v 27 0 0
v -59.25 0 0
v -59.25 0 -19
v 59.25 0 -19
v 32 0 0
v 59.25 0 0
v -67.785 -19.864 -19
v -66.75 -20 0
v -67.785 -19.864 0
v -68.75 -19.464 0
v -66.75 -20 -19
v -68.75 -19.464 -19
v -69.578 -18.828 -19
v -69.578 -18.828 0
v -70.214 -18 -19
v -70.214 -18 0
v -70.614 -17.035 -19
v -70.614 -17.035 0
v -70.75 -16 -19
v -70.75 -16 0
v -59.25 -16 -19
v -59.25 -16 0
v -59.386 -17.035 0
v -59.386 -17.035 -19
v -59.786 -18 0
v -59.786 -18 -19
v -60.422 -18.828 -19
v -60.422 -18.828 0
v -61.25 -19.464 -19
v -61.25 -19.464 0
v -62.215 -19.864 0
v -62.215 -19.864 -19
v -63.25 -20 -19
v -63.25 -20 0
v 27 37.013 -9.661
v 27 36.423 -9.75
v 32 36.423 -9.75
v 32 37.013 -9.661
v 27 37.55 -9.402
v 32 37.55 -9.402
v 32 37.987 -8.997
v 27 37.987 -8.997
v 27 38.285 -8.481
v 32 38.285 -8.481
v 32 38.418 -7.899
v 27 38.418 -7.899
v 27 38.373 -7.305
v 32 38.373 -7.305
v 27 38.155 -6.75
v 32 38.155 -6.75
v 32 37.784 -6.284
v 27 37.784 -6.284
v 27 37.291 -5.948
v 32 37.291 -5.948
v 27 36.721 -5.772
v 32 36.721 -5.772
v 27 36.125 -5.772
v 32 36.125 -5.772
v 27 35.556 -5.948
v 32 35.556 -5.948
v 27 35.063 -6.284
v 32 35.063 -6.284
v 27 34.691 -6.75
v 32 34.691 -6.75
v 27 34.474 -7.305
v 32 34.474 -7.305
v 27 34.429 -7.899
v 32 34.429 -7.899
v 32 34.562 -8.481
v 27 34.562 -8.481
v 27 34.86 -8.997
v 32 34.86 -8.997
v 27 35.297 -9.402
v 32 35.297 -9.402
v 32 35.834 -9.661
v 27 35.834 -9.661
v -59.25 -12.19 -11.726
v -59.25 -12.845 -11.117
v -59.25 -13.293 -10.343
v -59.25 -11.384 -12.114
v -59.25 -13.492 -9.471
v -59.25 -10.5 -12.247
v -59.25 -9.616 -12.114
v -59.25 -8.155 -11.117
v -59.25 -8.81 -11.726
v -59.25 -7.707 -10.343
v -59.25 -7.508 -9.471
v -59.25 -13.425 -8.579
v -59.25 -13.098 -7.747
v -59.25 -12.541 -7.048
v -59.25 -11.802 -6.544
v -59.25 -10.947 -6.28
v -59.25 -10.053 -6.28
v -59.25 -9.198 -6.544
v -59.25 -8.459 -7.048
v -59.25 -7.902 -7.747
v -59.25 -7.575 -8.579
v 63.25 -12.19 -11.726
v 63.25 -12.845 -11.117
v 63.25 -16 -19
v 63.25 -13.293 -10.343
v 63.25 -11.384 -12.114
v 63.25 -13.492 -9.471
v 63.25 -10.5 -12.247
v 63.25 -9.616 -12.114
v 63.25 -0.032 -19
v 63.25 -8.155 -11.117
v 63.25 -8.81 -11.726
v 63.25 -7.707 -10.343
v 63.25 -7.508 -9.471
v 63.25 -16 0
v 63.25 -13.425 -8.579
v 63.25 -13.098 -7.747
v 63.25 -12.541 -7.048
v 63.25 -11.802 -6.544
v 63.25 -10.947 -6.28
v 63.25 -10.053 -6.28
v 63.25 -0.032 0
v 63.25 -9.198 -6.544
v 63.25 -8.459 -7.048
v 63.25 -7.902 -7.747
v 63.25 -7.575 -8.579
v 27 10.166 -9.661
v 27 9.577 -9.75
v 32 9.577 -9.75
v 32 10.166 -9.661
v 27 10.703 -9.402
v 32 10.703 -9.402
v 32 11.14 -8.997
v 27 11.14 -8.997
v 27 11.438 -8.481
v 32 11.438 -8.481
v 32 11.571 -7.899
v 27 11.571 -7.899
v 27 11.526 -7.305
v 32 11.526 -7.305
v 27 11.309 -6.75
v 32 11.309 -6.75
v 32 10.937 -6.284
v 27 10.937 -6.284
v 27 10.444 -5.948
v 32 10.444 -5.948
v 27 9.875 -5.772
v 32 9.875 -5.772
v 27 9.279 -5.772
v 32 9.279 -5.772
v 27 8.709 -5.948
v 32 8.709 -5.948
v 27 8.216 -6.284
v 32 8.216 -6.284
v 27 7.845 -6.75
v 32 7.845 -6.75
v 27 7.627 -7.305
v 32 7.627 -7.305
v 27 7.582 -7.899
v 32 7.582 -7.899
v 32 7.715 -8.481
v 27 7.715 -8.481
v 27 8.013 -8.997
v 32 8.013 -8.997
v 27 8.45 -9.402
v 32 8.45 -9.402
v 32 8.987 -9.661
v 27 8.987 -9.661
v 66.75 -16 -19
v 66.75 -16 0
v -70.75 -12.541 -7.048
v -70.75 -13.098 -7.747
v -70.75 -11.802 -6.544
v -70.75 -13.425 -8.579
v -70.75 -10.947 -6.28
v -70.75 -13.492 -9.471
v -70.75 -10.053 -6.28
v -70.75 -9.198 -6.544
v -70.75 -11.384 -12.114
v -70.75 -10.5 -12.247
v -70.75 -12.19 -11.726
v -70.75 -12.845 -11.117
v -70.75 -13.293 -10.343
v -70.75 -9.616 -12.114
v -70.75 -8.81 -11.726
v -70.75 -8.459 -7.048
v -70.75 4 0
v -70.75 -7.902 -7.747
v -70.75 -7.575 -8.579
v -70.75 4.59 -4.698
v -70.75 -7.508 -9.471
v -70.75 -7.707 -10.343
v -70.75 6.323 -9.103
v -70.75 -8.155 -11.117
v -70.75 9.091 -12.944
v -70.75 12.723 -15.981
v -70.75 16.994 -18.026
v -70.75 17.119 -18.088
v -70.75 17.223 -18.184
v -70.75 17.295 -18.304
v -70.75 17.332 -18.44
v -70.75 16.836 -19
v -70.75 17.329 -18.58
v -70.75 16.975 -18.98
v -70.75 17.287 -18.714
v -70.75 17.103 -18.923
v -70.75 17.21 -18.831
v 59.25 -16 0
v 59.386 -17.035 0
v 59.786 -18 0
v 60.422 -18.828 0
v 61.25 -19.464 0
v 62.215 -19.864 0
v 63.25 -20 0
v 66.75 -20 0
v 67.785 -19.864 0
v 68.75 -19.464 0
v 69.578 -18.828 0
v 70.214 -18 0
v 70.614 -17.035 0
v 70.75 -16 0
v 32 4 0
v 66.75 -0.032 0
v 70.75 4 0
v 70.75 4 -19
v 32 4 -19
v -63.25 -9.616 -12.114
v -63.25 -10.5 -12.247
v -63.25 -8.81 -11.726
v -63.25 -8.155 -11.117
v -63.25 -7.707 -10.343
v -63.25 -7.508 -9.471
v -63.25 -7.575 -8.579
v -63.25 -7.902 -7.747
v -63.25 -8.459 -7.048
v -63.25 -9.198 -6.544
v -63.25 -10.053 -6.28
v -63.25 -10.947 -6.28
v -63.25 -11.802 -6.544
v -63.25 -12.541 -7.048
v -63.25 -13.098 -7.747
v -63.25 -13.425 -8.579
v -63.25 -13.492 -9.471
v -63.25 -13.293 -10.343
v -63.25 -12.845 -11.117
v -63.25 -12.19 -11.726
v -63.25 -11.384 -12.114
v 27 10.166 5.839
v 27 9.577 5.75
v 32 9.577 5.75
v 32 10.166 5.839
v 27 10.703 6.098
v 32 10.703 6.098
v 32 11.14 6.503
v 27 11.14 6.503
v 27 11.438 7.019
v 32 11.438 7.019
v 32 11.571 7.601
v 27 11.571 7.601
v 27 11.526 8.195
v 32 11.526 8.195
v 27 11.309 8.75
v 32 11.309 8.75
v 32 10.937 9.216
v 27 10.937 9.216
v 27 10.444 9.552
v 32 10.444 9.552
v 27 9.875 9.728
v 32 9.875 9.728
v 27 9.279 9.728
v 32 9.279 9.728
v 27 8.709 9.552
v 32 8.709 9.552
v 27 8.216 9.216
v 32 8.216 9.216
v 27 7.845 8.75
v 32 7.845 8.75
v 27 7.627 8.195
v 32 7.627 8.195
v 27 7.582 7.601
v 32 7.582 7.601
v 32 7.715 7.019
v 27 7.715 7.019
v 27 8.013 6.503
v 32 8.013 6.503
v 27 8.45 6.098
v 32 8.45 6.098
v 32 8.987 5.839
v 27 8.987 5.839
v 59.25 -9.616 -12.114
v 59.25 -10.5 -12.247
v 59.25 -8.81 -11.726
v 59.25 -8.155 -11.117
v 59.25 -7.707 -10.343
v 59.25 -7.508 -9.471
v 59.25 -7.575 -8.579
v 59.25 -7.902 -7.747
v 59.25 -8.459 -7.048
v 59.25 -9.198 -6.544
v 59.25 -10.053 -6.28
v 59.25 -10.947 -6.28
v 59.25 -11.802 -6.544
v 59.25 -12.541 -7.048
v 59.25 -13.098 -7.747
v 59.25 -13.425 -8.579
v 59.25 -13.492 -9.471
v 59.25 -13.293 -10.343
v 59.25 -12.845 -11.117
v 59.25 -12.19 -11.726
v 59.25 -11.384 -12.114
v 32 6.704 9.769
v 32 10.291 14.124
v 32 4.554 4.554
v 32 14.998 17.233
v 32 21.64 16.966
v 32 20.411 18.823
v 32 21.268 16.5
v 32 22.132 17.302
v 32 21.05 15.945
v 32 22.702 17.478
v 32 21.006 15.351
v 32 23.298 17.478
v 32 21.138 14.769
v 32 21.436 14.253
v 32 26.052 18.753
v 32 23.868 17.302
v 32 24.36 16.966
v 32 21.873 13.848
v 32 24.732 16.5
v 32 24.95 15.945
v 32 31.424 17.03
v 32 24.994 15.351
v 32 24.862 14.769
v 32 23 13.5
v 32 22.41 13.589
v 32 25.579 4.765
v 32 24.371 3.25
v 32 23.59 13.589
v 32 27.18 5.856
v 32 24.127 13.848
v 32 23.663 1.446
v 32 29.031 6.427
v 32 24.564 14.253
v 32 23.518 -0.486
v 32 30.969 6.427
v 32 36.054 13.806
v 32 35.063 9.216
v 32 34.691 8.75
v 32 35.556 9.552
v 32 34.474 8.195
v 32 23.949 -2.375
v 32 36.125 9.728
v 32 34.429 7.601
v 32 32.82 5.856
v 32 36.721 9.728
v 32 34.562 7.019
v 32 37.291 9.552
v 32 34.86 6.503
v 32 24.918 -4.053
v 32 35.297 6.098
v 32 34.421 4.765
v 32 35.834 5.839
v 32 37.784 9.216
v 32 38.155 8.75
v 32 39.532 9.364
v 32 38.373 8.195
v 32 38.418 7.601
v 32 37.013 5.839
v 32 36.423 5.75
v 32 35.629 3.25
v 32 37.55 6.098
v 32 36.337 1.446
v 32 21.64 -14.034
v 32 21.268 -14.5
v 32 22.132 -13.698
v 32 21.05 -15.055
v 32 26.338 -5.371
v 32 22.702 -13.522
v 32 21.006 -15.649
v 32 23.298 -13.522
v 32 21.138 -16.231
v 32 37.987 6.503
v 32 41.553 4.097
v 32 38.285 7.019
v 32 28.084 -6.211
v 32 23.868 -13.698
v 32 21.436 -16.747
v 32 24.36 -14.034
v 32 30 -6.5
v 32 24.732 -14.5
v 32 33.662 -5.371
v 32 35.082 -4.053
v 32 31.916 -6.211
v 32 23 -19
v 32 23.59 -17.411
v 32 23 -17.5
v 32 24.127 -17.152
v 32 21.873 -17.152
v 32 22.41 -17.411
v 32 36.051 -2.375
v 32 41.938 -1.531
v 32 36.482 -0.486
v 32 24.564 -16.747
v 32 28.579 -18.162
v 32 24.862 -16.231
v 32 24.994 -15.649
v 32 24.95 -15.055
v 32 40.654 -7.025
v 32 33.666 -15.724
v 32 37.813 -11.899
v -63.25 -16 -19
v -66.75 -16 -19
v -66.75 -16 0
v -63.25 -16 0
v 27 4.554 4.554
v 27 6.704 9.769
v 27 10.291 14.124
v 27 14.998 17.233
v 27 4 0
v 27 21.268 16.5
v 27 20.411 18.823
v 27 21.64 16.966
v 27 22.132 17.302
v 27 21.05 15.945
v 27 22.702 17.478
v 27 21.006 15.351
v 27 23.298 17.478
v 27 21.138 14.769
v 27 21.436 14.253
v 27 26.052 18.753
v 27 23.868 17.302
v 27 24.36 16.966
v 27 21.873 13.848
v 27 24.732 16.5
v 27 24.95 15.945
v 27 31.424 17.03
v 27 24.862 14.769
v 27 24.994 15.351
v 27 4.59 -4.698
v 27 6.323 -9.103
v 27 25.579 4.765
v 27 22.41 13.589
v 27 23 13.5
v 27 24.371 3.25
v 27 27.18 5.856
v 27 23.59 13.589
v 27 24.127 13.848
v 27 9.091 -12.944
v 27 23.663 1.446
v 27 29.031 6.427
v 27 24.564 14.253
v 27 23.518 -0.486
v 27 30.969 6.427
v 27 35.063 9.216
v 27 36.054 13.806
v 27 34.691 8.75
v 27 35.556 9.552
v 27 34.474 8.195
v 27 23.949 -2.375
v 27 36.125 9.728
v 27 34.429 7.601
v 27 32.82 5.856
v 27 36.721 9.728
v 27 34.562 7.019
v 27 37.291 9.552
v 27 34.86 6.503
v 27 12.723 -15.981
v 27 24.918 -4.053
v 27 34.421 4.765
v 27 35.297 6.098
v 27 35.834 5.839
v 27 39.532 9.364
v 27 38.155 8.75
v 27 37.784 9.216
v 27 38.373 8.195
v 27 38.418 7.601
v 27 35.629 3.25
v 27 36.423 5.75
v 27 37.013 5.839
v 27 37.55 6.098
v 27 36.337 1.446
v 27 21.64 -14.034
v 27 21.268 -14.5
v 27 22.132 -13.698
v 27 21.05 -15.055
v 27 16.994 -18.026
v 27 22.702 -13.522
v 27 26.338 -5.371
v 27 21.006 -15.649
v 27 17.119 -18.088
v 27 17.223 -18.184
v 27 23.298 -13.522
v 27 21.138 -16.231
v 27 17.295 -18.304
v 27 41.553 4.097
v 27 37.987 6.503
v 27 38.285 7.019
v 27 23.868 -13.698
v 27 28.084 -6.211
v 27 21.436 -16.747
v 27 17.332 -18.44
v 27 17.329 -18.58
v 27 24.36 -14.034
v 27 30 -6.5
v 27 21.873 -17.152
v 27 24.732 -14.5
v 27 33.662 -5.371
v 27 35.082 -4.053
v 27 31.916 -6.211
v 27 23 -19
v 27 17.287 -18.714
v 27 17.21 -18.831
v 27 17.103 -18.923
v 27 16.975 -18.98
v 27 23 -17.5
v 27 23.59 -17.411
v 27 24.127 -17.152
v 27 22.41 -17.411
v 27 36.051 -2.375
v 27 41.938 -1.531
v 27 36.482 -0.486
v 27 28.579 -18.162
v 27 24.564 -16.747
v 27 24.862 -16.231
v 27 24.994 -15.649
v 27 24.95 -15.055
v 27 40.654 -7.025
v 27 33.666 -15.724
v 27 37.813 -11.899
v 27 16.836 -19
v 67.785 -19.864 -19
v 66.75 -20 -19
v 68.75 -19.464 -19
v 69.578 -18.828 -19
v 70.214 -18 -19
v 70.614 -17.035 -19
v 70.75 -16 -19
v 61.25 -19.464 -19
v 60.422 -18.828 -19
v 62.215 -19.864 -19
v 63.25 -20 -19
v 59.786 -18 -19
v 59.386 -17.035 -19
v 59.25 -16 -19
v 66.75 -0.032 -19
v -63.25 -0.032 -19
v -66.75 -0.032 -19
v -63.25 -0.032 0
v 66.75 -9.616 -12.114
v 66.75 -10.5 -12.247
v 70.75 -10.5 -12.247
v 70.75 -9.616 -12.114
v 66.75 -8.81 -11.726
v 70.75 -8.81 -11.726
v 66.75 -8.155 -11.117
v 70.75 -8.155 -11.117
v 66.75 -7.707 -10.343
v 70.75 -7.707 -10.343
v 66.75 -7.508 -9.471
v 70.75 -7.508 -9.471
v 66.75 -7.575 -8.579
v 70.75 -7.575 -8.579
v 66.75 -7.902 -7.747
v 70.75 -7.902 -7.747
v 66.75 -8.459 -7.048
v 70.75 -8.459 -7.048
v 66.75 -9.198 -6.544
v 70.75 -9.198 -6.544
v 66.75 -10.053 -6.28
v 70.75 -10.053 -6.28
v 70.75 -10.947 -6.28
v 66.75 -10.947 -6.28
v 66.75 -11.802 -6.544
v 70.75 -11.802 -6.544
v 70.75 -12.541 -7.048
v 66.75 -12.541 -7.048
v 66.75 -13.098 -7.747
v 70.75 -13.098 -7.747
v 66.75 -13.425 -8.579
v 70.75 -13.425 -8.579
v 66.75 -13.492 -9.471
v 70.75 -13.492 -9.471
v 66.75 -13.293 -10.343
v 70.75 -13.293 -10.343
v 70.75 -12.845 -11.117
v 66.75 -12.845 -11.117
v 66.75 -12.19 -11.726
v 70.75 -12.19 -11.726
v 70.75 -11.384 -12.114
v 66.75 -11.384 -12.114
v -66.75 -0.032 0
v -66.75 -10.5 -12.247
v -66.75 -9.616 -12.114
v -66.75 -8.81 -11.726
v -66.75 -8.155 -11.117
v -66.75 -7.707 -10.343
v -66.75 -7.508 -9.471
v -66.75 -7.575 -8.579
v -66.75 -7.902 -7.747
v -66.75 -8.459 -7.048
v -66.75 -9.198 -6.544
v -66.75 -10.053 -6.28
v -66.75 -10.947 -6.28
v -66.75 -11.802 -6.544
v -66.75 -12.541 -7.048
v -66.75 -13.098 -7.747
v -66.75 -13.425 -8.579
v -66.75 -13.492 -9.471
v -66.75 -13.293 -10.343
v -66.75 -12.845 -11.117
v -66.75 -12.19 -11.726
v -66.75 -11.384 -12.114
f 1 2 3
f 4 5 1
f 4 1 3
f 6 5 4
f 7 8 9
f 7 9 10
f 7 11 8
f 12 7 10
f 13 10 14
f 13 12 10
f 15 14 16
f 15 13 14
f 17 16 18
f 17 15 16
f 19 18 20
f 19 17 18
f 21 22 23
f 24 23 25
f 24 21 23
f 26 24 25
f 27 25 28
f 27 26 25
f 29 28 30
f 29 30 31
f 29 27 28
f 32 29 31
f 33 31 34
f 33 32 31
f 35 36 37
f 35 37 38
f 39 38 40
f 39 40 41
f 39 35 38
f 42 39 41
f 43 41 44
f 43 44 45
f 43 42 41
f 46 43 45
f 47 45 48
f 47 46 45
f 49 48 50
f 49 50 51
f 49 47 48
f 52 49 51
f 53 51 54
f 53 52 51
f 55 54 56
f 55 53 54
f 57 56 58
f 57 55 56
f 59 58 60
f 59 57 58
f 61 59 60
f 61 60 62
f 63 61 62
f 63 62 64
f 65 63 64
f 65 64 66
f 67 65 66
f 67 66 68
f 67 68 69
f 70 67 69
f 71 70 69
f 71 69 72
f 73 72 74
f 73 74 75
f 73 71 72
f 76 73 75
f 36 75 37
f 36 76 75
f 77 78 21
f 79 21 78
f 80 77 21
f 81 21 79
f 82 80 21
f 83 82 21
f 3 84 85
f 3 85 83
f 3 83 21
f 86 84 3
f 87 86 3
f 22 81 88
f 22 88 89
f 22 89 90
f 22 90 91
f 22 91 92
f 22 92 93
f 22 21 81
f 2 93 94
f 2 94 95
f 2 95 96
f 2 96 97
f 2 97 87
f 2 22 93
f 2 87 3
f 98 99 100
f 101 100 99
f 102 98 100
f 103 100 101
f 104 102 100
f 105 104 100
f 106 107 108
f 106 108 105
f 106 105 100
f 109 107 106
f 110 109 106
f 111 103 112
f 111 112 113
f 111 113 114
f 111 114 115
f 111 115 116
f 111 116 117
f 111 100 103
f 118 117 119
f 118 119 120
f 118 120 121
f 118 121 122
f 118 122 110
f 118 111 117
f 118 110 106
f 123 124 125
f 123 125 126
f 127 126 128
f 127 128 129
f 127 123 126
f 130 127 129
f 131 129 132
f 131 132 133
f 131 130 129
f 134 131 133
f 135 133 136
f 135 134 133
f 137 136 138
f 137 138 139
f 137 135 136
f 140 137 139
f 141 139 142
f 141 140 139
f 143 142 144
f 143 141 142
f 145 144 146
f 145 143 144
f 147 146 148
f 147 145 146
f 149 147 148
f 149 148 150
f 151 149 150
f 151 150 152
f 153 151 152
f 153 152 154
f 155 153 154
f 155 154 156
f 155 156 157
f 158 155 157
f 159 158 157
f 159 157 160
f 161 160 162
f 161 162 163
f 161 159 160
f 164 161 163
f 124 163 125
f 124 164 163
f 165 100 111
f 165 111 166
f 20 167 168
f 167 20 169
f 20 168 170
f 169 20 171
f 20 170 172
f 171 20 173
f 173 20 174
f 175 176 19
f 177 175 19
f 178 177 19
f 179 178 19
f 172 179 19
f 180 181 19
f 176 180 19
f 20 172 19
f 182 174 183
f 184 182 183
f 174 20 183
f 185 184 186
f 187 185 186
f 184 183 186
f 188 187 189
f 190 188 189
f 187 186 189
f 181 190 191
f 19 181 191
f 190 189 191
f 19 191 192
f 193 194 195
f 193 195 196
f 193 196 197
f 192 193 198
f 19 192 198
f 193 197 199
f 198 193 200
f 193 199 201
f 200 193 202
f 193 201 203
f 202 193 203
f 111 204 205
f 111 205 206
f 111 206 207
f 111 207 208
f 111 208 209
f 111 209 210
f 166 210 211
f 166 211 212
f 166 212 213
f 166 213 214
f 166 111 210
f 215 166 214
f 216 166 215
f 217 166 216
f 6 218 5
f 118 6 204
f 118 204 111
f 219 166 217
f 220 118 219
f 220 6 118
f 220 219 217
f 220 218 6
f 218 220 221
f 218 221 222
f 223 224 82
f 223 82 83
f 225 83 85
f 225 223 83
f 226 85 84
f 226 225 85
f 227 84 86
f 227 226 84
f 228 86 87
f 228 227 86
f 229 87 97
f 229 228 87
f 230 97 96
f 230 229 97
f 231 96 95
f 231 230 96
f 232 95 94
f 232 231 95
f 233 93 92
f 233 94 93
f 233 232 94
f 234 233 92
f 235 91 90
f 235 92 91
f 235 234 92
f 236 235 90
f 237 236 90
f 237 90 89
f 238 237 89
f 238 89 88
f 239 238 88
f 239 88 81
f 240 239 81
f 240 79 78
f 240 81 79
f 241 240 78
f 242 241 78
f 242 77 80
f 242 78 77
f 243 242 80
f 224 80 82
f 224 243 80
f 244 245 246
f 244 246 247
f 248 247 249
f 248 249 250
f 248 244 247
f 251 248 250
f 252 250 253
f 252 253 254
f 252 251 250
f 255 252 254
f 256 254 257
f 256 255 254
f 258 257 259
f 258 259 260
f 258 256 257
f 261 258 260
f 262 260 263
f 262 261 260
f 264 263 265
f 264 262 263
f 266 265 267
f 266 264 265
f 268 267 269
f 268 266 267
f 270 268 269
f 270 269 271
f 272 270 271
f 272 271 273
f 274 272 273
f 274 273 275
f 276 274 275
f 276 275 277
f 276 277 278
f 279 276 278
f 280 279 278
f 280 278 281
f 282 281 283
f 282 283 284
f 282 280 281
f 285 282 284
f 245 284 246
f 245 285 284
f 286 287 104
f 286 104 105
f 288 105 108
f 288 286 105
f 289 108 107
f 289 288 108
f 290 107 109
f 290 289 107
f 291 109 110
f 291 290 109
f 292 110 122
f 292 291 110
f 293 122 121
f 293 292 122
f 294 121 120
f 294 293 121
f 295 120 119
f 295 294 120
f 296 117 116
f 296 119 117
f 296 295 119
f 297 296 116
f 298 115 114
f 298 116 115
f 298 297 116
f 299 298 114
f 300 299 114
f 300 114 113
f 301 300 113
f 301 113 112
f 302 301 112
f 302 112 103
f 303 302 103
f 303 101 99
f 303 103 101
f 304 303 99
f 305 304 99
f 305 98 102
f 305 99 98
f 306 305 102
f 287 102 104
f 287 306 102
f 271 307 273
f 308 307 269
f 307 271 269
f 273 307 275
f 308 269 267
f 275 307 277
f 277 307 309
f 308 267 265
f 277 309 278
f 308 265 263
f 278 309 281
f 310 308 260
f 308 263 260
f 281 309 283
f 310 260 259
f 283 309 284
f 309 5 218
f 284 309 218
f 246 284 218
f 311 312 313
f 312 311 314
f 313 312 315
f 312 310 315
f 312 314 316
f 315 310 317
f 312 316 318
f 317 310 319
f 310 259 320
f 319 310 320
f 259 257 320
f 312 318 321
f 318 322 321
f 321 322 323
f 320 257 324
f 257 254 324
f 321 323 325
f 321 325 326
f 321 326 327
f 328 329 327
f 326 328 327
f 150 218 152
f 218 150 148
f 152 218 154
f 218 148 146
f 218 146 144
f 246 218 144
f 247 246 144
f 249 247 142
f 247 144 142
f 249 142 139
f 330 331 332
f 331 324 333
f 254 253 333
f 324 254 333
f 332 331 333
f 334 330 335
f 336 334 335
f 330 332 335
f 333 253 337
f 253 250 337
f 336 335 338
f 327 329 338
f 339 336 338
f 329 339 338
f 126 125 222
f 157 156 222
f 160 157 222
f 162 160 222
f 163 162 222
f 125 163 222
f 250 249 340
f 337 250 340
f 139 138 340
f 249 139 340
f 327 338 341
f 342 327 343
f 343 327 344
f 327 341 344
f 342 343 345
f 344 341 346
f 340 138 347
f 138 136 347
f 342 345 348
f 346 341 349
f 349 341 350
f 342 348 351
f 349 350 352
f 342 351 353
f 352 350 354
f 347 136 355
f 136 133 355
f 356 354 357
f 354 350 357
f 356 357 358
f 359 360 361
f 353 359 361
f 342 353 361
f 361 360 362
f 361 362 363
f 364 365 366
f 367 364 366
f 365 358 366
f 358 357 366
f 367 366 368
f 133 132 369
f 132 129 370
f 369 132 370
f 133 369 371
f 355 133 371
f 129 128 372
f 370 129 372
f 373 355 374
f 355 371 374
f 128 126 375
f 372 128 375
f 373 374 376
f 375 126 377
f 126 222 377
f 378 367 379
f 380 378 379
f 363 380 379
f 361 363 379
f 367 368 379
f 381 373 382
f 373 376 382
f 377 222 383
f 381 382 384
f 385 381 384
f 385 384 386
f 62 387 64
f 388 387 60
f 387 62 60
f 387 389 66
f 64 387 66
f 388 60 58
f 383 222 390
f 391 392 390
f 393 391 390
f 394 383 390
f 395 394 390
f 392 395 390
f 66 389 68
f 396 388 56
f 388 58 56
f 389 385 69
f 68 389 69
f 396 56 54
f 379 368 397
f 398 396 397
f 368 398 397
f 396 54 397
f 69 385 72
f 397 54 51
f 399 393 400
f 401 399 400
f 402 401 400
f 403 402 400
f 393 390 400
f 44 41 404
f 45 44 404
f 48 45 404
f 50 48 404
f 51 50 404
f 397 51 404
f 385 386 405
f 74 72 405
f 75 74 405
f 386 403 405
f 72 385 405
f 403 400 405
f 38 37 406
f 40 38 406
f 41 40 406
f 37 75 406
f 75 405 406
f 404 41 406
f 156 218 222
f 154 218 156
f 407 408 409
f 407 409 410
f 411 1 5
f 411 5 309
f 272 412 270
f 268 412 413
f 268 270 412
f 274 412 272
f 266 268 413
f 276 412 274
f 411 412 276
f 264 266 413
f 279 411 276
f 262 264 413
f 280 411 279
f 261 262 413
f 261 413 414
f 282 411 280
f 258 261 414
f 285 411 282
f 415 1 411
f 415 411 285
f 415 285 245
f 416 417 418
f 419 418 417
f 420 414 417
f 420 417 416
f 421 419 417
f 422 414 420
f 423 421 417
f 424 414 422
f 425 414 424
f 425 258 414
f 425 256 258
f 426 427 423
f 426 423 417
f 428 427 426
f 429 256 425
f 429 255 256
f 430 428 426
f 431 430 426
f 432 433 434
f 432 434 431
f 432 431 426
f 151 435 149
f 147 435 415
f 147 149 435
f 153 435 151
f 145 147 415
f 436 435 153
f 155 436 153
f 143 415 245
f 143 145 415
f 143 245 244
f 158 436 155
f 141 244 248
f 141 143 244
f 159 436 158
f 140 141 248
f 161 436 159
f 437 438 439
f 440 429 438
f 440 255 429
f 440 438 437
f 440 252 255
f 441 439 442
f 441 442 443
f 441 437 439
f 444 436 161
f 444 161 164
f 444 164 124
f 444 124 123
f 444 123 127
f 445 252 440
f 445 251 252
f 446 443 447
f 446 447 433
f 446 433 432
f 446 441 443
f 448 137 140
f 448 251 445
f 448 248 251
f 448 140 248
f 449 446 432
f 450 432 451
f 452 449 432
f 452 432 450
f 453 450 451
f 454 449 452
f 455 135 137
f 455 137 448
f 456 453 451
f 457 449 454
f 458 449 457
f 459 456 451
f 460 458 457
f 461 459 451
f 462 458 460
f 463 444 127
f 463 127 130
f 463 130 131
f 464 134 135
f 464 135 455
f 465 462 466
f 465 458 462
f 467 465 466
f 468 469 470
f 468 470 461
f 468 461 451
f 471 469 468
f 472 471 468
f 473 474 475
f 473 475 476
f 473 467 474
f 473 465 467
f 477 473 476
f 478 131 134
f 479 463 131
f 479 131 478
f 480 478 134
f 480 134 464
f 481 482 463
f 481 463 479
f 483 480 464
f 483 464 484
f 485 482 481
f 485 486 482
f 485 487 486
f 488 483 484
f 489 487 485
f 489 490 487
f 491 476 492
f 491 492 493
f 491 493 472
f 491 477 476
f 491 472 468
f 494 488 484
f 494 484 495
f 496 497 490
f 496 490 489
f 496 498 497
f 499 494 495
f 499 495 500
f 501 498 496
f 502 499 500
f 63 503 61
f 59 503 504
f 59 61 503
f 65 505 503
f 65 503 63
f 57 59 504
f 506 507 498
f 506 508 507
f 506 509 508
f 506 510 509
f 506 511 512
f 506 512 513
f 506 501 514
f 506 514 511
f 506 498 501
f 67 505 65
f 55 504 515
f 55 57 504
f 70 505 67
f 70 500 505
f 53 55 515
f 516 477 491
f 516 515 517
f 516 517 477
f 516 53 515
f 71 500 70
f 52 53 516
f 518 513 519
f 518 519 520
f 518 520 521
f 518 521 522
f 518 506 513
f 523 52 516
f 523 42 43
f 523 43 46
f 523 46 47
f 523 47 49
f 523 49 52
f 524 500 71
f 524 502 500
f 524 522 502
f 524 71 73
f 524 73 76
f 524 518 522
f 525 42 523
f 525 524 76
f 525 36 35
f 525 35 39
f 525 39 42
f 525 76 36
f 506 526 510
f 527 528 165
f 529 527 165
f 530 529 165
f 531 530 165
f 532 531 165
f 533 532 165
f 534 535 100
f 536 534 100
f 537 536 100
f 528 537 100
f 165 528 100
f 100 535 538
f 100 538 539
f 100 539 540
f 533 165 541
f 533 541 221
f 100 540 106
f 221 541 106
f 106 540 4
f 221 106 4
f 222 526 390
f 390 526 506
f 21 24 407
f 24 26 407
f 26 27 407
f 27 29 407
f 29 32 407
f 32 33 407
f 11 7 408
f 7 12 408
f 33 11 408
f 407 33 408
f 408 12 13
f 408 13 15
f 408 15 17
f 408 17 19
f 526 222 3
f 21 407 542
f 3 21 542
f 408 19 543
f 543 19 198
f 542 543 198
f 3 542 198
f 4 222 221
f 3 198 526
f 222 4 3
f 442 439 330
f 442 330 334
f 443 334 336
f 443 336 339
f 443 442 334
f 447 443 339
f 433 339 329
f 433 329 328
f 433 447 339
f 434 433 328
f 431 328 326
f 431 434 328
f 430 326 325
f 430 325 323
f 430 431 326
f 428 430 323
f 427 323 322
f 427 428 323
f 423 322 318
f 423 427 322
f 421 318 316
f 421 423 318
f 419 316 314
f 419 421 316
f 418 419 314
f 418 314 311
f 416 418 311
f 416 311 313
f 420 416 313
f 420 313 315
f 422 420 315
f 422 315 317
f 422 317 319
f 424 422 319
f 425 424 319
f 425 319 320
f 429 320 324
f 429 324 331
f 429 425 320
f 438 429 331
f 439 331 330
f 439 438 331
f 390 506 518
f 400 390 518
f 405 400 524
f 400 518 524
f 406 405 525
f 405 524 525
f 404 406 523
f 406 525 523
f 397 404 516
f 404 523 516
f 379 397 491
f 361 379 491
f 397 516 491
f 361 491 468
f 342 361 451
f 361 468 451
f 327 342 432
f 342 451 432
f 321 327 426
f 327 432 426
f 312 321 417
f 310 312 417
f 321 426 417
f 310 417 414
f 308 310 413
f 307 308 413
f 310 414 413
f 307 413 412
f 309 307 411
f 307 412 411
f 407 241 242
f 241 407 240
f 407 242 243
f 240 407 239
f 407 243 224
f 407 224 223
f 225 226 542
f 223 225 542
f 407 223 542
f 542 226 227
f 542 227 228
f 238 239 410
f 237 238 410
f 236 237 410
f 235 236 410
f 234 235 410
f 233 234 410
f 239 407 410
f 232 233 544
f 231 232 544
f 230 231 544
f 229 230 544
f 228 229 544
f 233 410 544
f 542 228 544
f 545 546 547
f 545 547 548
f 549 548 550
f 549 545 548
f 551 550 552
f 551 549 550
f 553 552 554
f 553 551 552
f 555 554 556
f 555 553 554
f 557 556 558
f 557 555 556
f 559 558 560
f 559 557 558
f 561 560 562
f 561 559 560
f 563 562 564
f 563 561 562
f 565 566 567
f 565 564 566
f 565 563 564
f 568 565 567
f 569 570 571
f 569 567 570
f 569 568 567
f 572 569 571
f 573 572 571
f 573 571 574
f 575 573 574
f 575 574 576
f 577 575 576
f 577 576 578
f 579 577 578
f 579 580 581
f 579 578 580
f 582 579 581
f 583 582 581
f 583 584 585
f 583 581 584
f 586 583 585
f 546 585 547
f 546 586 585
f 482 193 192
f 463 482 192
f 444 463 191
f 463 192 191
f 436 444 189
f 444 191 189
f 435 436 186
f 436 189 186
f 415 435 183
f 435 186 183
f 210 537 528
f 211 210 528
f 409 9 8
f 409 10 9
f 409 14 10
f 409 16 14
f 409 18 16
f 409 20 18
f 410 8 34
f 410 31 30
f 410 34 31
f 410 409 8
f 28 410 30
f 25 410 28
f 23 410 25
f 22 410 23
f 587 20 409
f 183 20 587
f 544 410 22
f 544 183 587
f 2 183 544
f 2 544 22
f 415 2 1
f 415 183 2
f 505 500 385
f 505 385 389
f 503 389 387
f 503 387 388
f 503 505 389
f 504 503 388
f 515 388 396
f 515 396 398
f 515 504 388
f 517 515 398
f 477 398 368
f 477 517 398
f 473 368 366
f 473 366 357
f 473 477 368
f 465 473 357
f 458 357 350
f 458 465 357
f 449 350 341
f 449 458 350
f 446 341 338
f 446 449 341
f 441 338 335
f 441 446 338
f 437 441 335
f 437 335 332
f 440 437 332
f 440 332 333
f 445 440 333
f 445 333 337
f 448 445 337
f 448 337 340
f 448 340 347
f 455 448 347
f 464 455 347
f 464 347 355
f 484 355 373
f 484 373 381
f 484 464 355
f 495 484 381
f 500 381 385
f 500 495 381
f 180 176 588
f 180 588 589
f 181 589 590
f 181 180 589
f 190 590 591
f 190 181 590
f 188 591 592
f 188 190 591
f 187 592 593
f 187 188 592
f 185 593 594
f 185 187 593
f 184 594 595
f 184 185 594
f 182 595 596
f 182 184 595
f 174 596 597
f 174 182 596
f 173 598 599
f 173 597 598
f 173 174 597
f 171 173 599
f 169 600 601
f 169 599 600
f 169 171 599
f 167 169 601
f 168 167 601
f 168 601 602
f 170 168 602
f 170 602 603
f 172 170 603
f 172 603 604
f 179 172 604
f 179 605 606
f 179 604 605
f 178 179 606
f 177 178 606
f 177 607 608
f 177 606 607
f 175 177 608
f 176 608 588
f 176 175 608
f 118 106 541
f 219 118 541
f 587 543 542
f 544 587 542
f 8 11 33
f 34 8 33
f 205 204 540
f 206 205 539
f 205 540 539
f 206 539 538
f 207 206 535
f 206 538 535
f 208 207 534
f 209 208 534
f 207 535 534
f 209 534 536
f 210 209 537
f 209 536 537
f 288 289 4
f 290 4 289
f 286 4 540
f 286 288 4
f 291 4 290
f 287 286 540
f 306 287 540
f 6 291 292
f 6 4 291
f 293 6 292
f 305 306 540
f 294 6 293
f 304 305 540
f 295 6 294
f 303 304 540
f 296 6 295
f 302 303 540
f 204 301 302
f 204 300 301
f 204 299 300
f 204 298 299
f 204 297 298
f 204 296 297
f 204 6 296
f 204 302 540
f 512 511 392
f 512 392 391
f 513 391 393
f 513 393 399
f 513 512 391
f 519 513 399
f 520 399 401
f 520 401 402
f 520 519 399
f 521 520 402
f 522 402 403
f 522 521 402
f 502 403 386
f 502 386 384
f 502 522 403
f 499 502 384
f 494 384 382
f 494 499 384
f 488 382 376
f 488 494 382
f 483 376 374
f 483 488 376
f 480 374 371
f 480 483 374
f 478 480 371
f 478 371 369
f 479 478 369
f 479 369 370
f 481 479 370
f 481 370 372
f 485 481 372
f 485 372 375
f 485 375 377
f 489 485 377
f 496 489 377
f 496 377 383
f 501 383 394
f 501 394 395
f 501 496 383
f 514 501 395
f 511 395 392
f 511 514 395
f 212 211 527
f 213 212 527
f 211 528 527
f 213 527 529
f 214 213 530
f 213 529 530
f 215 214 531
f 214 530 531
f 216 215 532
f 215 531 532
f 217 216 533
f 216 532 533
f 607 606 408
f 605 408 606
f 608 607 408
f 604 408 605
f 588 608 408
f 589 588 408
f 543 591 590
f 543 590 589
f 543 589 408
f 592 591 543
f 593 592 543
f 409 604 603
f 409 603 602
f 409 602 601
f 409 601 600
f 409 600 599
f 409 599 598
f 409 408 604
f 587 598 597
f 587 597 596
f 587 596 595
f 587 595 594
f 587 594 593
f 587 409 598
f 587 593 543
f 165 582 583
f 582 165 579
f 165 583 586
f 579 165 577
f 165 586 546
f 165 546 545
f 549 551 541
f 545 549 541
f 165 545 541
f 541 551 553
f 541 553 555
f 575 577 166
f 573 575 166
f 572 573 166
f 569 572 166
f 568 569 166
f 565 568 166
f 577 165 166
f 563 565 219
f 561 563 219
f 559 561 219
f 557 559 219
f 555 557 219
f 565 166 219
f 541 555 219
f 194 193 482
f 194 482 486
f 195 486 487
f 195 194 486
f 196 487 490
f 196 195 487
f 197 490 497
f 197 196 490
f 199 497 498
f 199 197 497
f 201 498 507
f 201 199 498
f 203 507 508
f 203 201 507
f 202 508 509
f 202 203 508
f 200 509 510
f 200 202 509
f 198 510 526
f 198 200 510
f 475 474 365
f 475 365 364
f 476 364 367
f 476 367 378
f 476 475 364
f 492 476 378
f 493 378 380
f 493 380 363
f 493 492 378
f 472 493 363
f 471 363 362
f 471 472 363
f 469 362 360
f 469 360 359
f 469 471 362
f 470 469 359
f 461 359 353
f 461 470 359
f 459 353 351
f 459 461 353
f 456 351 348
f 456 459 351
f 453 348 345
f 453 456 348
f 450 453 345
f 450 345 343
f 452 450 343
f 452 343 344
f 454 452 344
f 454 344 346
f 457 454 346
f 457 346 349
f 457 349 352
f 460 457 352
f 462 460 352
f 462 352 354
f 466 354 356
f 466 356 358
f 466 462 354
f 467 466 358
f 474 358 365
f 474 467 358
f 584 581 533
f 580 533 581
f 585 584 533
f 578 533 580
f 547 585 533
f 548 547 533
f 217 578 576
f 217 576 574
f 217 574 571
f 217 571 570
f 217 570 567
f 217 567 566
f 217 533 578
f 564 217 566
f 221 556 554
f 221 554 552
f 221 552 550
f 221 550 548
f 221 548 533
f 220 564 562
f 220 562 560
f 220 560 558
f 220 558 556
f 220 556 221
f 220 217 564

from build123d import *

# Parameters (mm, degrees)
SKETCH1_W               = 3.5
SKETCH1_H               = 15.967998052
BOSS_EXTRUDE1_DEPTH     = 19
BOSS_EXTRUDE2_START     = 27
SKETCH2_R               = 6.5
SKETCH2_R_2             = 2
BOSS_EXTRUDE2_DEPTH     = 5
BOSS_EXTRUDE3_DEPTH     = 97.75
FILLET1_START           = -72
FILLET1_DEPTH           = 99
CUT_EXTRUDE1_DEPTH      = 85.442658059
CUT_EXTRUDE1_DEPTH_BACK = 85.442658059
SKETCH4_R               = 3
CHAMFER1_SIZE           = 4
FILLET3_R               = 4


with BuildPart() as part:
    # Sketch1 → Boss-Extrude1 (new body)
    with BuildSketch(Plane.XY):
        Polygon((-59.25, 0), (59.25, 0), (59.25, -20), (70.75, -20), (70.75, 4), (-70.75, 4), (-70.75, -20), (-59.25, -20), align=None)
        with Locations((65, -8.016000974)):
            Rectangle(SKETCH1_W, SKETCH1_H, mode=Mode.SUBTRACT)
        with Locations((-65, -8.016000974)):
            Rectangle(SKETCH1_W, SKETCH1_H, mode=Mode.SUBTRACT)
    extrude(amount=-BOSS_EXTRUDE1_DEPTH)

    # Sketch2 → Boss-Extrude2 (add)
    with BuildSketch(Plane(origin=(0, 0, 0), x_dir=(0, 0, -1), z_dir=(1, 0, 0)).offset(BOSS_EXTRUDE2_START)):
        with BuildLine():
            Line((19, 4), (19, 23))
            ThreePointArc((19, 23), (-13.435028843, 36.435028843), (0, 4))
            Line((0, 4), (19, 4))
        make_face()
        with Locations((0, 30)):
            Circle(SKETCH2_R, mode=Mode.SUBTRACT)
        with Locations((15.5, 23)):
            Circle(SKETCH2_R_2, mode=Mode.SUBTRACT)
        with Locations((7.75, 9.576606241)):
            Circle(SKETCH2_R_2, mode=Mode.SUBTRACT)
        with Locations((-7.75, 9.576606241)):
            Circle(SKETCH2_R_2, mode=Mode.SUBTRACT)
        with Locations((-15.5, 23)):
            Circle(SKETCH2_R_2, mode=Mode.SUBTRACT)
        with Locations((-7.75, 36.423393759)):
            Circle(SKETCH2_R_2, mode=Mode.SUBTRACT)
        with Locations((7.75, 36.423393759)):
            Circle(SKETCH2_R_2, mode=Mode.SUBTRACT)
    extrude(amount=BOSS_EXTRUDE2_DEPTH)

    # Sketch3 → Boss-Extrude3 (add)
    with BuildSketch(Plane.ZY.offset(70.75)):
        with BuildLine():
            Line((0, 4), (-19, 4))
            Line((-19, 4), (-19, 23))
            ThreePointArc((-19, 23), (-13.435028843, 9.564971157), (0, 4))
        make_face()
    extrude(amount=-BOSS_EXTRUDE3_DEPTH)

    # Fillet1: read off the stored shape, not the designer's step
    # Fillet1 outline → Fillet1 (cut)
    with BuildSketch(Plane.YZ.offset(FILLET1_START)):
        with BuildLine():
            ThreePointArc((23, -19), (19.957565078, -18.754828438), (16.993647895, -18.025641026))
            ThreePointArc((16.993647895, -18.025641026), (17.329134114, -18.580064077), (16.835585997, -19))
            Line((16.835585997, -19), (23, -19))
        make_face()
    extrude(amount=FILLET1_DEPTH, mode=Mode.SUBTRACT)

    # Sketch4 → Cut-Extrude1 (cut, two sides: drawn at the far end of the back side and taken through both)
    with BuildSketch(Plane(origin=(0, 0, 0), x_dir=(0, 0, -1), z_dir=(1, 0, 0)).offset(-CUT_EXTRUDE1_DEPTH_BACK)):
        with Locations((9.246961263, -10.5)):
            Circle(SKETCH4_R)
    extrude(amount=CUT_EXTRUDE1_DEPTH + CUT_EXTRUDE1_DEPTH_BACK, mode=Mode.SUBTRACT)

    # Chamfer1
    # the kernel refuses this chamfer: 4 mm, written as the material it adds along each edge
    with BuildSketch(Plane(origin=(27, 4, 0), x_dir=(0, -1, 0), z_dir=(1, 0, 0))) as chamfer1_piece_1:
        with BuildLine():
            Line((CHAMFER1_SIZE, 0), (-0.553778005, -4.553778005))
            ThreePointArc((-0.553778005, -4.553778005), (-0.146737714, -2.356798922), (0, 0))
            Line((0, 0), (CHAMFER1_SIZE, 0))
        make_face()
    extrude(amount=5)

    # Fillet3
    fillet3_edges = [part.edges().sort_by_distance(p)[0] for p in [
        (59.25, -20, -9.5),
        (-59.25, -20, -9.5),
        (-70.75, -20, -9.5),
        (70.75, -20, -9.5),
    ]]
    fillet(fillet3_edges, radius=FILLET3_R)


solid = part.part
